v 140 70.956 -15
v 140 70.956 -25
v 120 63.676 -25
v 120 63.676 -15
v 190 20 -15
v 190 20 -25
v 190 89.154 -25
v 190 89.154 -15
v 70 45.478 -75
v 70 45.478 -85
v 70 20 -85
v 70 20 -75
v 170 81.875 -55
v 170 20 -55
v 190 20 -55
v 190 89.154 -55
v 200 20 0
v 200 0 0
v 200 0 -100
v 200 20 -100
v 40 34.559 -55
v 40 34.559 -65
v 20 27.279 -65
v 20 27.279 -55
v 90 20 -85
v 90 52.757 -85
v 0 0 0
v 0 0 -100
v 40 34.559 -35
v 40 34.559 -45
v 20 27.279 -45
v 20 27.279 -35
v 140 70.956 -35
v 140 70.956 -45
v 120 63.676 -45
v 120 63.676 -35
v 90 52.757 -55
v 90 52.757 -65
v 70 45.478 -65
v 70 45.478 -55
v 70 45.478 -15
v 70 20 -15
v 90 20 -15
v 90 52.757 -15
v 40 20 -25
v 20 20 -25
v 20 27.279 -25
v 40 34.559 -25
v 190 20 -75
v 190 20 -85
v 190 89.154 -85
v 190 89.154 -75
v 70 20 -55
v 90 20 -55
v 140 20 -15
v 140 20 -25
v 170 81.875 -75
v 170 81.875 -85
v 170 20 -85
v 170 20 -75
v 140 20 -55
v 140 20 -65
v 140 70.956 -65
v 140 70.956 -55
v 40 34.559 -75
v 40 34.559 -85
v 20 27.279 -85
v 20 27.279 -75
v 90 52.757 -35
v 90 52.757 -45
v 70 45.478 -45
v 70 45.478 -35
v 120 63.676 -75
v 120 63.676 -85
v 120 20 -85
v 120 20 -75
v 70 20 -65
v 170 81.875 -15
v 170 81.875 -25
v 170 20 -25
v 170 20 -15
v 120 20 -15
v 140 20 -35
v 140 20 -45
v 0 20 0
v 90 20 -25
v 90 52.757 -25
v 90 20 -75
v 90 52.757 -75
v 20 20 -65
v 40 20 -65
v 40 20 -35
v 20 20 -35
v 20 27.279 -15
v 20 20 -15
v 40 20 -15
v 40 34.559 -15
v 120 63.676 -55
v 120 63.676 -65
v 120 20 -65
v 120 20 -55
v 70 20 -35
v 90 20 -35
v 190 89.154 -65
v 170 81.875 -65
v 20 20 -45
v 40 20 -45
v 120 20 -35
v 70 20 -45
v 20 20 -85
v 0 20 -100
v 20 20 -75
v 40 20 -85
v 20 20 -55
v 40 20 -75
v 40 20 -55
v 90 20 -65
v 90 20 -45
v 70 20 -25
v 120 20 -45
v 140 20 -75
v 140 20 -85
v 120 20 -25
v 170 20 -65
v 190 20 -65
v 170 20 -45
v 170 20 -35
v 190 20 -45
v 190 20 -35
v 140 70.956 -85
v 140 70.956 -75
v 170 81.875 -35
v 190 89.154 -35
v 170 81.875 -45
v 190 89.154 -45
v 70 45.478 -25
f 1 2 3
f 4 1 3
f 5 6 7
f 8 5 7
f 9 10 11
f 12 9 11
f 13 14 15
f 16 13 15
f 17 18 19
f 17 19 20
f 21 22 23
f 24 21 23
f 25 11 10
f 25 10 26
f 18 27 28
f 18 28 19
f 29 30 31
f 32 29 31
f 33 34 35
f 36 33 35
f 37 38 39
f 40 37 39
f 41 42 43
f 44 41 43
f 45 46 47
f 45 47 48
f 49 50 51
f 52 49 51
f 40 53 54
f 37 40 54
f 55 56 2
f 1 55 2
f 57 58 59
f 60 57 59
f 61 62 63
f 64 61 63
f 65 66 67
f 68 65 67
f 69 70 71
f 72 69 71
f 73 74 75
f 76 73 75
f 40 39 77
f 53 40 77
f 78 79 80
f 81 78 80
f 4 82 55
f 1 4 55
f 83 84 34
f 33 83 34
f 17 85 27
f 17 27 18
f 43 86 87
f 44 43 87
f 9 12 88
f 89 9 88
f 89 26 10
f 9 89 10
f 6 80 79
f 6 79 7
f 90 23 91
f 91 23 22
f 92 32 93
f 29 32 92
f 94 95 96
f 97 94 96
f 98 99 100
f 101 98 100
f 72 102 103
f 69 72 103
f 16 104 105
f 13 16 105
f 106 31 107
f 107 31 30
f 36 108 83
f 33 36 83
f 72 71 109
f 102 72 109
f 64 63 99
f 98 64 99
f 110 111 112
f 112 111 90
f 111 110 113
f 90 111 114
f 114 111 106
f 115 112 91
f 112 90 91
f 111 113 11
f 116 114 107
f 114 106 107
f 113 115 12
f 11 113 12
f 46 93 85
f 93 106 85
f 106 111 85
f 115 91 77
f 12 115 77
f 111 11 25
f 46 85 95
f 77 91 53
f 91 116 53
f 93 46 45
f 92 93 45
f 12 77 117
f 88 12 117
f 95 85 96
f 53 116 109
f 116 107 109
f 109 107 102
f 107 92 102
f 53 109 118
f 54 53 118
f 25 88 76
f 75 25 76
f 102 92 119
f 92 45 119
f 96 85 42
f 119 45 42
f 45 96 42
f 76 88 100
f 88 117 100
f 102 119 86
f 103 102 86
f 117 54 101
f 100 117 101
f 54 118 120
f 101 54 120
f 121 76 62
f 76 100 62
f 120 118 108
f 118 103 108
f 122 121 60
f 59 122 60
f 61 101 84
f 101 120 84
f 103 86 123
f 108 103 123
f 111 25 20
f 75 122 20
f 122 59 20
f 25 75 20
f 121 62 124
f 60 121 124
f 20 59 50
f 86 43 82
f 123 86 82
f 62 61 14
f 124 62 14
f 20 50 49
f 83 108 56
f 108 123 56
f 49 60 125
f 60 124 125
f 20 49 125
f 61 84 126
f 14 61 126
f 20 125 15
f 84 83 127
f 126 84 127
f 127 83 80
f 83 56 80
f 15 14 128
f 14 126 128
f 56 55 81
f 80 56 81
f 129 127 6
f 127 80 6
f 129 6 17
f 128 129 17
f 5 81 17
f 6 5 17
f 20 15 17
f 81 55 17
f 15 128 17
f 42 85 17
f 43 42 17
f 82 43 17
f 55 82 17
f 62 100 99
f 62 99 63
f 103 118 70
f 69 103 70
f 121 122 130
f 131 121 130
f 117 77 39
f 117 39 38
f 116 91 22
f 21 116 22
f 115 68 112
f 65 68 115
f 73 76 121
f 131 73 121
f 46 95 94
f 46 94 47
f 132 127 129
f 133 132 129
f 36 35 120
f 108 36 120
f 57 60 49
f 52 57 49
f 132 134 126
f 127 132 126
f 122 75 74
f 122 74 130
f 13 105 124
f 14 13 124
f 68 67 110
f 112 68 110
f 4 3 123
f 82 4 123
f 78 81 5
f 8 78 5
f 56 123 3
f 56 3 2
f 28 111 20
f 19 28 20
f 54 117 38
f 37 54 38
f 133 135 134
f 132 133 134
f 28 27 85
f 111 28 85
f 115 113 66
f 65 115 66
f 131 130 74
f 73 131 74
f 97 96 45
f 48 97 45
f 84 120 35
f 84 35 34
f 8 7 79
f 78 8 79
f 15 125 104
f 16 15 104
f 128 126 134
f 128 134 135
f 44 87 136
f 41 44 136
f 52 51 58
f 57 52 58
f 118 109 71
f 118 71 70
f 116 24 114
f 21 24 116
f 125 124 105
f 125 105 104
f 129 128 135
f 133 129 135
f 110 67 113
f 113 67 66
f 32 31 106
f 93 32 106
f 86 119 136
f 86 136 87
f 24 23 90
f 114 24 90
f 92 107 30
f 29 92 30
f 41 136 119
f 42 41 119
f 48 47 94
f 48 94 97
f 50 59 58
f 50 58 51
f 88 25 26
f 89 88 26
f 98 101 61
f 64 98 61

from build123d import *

# Parameters (mm, degrees)
SKETCH_1_W               = 200
SKETCH_1_H               = 20
EXTRUDE_2_DEPTH          = 100
EXTRUDE_3_REACH          = 226.499
SKETCH_3_W               = 20
SKETCH_3_H               = 10
PATTERN_START            = -85
PATTERN_LINEAR_1_DEPTH   = 10
PATTERN_START_2          = -65
PATTERN_LINEAR_1_2_DEPTH = 10
PATTERN_START_3          = -45
PATTERN_LINEAR_1_3_DEPTH = 10
PATTERN_START_4          = -25
PATTERN_LINEAR_1_4_DEPTH = 10


# Read off the part's stored shape, not the designer's step: Линейный массив1
with BuildPart() as part:
    # Эскиз1 → Бобышка-Вытянуть2 (new body)
    with BuildSketch(Plane.XY):
        with Locations((100, 10)):
            Rectangle(SKETCH_1_W, SKETCH_1_H)
    extrude(amount=-EXTRUDE_2_DEPTH)

    # Бобышка-Вытянуть3: up to this plane
    extrude_3_end = Plane(origin=(-6.427876097, 17.660444431, 0), z_dir=(-0.34202014332566943, 0.9396926207859081, 0))
    # Эскиз3 → Бобышка-Вытянуть3 (add, up to the surface)
    with BuildSketch(Plane(origin=(0, 20, 0), x_dir=(1, 0, 0), z_dir=(0, 1, 0)), mode=Mode.PRIVATE) as extrude_3_sk1:
        with Locations((30, 20)):
            Rectangle(SKETCH_3_W, SKETCH_3_H)
    extrude_3_tool1 = split(extrude(extrude_3_sk1.sketch, amount=EXTRUDE_3_REACH, mode=Mode.PRIVATE), bisect_by=extrude_3_end, keep=Keep.BOTH, mode=Mode.PRIVATE)
    add(extrude_3_tool1.solids().sort_by_distance((30, 20, -20))[0])

    # Линейный массив1 outline → Линейный массив1 (add)
    with BuildSketch(Plane.XY.offset(PATTERN_START)):
        Polygon((170, 81.874939825), (170, 20), (190, 20), (190, 89.154344511), align=None)
        Polygon((120, 63.676428112), (120, 20), (140, 20), (140, 70.955832797), align=None)
        Polygon((70, 45.477916399), (70, 20), (90, 20), (90, 52.757321084), align=None)
        Polygon((20, 27.279404685), (20, 20), (40, 20), (40, 34.558809371), align=None)
    extrude(amount=PATTERN_LINEAR_1_DEPTH)

    # Pattern Linear 1 2 outline → Pattern Linear 1 2 (add)
    with BuildSketch(Plane.XY.offset(PATTERN_START_2)):
        Polygon((170, 81.874939825), (170, 20), (190, 20), (190, 89.154344511), align=None)
        Polygon((120, 63.676428112), (120, 20), (140, 20), (140, 70.955832797), align=None)
        Polygon((70, 45.477916399), (70, 20), (90, 20), (90, 52.757321084), align=None)
        Polygon((20, 27.279404685), (20, 20), (40, 20), (40, 34.558809371), align=None)
    extrude(amount=PATTERN_LINEAR_1_2_DEPTH)

    # Pattern Linear 1 3 outline → Pattern Linear 1 3 (add)
    with BuildSketch(Plane.XY.offset(PATTERN_START_3)):
        Polygon((170, 81.874939825), (170, 20), (190, 20), (190, 89.154344511), align=None)
        Polygon((120, 63.676428112), (120, 20), (140, 20), (140, 70.955832797), align=None)
        Polygon((70, 45.477916399), (70, 20), (90, 20), (90, 52.757321084), align=None)
        Polygon((20, 27.279404685), (20, 20), (40, 20), (40, 34.558809371), align=None)
    extrude(amount=PATTERN_LINEAR_1_3_DEPTH)

    # Pattern Linear 1 4 outline → Pattern Linear 1 4 (add)
    with BuildSketch(Plane.XY.offset(PATTERN_START_4)):
        Polygon((170, 81.874939825), (170, 20), (190, 20), (190, 89.154344511), align=None)
        Polygon((120, 63.676428112), (120, 20), (140, 20), (140, 70.955832797), align=None)
        Polygon((70, 45.477916399), (70, 20), (90, 20), (90, 52.757321084), align=None)
    extrude(amount=PATTERN_LINEAR_1_4_DEPTH)


solid = part.part
